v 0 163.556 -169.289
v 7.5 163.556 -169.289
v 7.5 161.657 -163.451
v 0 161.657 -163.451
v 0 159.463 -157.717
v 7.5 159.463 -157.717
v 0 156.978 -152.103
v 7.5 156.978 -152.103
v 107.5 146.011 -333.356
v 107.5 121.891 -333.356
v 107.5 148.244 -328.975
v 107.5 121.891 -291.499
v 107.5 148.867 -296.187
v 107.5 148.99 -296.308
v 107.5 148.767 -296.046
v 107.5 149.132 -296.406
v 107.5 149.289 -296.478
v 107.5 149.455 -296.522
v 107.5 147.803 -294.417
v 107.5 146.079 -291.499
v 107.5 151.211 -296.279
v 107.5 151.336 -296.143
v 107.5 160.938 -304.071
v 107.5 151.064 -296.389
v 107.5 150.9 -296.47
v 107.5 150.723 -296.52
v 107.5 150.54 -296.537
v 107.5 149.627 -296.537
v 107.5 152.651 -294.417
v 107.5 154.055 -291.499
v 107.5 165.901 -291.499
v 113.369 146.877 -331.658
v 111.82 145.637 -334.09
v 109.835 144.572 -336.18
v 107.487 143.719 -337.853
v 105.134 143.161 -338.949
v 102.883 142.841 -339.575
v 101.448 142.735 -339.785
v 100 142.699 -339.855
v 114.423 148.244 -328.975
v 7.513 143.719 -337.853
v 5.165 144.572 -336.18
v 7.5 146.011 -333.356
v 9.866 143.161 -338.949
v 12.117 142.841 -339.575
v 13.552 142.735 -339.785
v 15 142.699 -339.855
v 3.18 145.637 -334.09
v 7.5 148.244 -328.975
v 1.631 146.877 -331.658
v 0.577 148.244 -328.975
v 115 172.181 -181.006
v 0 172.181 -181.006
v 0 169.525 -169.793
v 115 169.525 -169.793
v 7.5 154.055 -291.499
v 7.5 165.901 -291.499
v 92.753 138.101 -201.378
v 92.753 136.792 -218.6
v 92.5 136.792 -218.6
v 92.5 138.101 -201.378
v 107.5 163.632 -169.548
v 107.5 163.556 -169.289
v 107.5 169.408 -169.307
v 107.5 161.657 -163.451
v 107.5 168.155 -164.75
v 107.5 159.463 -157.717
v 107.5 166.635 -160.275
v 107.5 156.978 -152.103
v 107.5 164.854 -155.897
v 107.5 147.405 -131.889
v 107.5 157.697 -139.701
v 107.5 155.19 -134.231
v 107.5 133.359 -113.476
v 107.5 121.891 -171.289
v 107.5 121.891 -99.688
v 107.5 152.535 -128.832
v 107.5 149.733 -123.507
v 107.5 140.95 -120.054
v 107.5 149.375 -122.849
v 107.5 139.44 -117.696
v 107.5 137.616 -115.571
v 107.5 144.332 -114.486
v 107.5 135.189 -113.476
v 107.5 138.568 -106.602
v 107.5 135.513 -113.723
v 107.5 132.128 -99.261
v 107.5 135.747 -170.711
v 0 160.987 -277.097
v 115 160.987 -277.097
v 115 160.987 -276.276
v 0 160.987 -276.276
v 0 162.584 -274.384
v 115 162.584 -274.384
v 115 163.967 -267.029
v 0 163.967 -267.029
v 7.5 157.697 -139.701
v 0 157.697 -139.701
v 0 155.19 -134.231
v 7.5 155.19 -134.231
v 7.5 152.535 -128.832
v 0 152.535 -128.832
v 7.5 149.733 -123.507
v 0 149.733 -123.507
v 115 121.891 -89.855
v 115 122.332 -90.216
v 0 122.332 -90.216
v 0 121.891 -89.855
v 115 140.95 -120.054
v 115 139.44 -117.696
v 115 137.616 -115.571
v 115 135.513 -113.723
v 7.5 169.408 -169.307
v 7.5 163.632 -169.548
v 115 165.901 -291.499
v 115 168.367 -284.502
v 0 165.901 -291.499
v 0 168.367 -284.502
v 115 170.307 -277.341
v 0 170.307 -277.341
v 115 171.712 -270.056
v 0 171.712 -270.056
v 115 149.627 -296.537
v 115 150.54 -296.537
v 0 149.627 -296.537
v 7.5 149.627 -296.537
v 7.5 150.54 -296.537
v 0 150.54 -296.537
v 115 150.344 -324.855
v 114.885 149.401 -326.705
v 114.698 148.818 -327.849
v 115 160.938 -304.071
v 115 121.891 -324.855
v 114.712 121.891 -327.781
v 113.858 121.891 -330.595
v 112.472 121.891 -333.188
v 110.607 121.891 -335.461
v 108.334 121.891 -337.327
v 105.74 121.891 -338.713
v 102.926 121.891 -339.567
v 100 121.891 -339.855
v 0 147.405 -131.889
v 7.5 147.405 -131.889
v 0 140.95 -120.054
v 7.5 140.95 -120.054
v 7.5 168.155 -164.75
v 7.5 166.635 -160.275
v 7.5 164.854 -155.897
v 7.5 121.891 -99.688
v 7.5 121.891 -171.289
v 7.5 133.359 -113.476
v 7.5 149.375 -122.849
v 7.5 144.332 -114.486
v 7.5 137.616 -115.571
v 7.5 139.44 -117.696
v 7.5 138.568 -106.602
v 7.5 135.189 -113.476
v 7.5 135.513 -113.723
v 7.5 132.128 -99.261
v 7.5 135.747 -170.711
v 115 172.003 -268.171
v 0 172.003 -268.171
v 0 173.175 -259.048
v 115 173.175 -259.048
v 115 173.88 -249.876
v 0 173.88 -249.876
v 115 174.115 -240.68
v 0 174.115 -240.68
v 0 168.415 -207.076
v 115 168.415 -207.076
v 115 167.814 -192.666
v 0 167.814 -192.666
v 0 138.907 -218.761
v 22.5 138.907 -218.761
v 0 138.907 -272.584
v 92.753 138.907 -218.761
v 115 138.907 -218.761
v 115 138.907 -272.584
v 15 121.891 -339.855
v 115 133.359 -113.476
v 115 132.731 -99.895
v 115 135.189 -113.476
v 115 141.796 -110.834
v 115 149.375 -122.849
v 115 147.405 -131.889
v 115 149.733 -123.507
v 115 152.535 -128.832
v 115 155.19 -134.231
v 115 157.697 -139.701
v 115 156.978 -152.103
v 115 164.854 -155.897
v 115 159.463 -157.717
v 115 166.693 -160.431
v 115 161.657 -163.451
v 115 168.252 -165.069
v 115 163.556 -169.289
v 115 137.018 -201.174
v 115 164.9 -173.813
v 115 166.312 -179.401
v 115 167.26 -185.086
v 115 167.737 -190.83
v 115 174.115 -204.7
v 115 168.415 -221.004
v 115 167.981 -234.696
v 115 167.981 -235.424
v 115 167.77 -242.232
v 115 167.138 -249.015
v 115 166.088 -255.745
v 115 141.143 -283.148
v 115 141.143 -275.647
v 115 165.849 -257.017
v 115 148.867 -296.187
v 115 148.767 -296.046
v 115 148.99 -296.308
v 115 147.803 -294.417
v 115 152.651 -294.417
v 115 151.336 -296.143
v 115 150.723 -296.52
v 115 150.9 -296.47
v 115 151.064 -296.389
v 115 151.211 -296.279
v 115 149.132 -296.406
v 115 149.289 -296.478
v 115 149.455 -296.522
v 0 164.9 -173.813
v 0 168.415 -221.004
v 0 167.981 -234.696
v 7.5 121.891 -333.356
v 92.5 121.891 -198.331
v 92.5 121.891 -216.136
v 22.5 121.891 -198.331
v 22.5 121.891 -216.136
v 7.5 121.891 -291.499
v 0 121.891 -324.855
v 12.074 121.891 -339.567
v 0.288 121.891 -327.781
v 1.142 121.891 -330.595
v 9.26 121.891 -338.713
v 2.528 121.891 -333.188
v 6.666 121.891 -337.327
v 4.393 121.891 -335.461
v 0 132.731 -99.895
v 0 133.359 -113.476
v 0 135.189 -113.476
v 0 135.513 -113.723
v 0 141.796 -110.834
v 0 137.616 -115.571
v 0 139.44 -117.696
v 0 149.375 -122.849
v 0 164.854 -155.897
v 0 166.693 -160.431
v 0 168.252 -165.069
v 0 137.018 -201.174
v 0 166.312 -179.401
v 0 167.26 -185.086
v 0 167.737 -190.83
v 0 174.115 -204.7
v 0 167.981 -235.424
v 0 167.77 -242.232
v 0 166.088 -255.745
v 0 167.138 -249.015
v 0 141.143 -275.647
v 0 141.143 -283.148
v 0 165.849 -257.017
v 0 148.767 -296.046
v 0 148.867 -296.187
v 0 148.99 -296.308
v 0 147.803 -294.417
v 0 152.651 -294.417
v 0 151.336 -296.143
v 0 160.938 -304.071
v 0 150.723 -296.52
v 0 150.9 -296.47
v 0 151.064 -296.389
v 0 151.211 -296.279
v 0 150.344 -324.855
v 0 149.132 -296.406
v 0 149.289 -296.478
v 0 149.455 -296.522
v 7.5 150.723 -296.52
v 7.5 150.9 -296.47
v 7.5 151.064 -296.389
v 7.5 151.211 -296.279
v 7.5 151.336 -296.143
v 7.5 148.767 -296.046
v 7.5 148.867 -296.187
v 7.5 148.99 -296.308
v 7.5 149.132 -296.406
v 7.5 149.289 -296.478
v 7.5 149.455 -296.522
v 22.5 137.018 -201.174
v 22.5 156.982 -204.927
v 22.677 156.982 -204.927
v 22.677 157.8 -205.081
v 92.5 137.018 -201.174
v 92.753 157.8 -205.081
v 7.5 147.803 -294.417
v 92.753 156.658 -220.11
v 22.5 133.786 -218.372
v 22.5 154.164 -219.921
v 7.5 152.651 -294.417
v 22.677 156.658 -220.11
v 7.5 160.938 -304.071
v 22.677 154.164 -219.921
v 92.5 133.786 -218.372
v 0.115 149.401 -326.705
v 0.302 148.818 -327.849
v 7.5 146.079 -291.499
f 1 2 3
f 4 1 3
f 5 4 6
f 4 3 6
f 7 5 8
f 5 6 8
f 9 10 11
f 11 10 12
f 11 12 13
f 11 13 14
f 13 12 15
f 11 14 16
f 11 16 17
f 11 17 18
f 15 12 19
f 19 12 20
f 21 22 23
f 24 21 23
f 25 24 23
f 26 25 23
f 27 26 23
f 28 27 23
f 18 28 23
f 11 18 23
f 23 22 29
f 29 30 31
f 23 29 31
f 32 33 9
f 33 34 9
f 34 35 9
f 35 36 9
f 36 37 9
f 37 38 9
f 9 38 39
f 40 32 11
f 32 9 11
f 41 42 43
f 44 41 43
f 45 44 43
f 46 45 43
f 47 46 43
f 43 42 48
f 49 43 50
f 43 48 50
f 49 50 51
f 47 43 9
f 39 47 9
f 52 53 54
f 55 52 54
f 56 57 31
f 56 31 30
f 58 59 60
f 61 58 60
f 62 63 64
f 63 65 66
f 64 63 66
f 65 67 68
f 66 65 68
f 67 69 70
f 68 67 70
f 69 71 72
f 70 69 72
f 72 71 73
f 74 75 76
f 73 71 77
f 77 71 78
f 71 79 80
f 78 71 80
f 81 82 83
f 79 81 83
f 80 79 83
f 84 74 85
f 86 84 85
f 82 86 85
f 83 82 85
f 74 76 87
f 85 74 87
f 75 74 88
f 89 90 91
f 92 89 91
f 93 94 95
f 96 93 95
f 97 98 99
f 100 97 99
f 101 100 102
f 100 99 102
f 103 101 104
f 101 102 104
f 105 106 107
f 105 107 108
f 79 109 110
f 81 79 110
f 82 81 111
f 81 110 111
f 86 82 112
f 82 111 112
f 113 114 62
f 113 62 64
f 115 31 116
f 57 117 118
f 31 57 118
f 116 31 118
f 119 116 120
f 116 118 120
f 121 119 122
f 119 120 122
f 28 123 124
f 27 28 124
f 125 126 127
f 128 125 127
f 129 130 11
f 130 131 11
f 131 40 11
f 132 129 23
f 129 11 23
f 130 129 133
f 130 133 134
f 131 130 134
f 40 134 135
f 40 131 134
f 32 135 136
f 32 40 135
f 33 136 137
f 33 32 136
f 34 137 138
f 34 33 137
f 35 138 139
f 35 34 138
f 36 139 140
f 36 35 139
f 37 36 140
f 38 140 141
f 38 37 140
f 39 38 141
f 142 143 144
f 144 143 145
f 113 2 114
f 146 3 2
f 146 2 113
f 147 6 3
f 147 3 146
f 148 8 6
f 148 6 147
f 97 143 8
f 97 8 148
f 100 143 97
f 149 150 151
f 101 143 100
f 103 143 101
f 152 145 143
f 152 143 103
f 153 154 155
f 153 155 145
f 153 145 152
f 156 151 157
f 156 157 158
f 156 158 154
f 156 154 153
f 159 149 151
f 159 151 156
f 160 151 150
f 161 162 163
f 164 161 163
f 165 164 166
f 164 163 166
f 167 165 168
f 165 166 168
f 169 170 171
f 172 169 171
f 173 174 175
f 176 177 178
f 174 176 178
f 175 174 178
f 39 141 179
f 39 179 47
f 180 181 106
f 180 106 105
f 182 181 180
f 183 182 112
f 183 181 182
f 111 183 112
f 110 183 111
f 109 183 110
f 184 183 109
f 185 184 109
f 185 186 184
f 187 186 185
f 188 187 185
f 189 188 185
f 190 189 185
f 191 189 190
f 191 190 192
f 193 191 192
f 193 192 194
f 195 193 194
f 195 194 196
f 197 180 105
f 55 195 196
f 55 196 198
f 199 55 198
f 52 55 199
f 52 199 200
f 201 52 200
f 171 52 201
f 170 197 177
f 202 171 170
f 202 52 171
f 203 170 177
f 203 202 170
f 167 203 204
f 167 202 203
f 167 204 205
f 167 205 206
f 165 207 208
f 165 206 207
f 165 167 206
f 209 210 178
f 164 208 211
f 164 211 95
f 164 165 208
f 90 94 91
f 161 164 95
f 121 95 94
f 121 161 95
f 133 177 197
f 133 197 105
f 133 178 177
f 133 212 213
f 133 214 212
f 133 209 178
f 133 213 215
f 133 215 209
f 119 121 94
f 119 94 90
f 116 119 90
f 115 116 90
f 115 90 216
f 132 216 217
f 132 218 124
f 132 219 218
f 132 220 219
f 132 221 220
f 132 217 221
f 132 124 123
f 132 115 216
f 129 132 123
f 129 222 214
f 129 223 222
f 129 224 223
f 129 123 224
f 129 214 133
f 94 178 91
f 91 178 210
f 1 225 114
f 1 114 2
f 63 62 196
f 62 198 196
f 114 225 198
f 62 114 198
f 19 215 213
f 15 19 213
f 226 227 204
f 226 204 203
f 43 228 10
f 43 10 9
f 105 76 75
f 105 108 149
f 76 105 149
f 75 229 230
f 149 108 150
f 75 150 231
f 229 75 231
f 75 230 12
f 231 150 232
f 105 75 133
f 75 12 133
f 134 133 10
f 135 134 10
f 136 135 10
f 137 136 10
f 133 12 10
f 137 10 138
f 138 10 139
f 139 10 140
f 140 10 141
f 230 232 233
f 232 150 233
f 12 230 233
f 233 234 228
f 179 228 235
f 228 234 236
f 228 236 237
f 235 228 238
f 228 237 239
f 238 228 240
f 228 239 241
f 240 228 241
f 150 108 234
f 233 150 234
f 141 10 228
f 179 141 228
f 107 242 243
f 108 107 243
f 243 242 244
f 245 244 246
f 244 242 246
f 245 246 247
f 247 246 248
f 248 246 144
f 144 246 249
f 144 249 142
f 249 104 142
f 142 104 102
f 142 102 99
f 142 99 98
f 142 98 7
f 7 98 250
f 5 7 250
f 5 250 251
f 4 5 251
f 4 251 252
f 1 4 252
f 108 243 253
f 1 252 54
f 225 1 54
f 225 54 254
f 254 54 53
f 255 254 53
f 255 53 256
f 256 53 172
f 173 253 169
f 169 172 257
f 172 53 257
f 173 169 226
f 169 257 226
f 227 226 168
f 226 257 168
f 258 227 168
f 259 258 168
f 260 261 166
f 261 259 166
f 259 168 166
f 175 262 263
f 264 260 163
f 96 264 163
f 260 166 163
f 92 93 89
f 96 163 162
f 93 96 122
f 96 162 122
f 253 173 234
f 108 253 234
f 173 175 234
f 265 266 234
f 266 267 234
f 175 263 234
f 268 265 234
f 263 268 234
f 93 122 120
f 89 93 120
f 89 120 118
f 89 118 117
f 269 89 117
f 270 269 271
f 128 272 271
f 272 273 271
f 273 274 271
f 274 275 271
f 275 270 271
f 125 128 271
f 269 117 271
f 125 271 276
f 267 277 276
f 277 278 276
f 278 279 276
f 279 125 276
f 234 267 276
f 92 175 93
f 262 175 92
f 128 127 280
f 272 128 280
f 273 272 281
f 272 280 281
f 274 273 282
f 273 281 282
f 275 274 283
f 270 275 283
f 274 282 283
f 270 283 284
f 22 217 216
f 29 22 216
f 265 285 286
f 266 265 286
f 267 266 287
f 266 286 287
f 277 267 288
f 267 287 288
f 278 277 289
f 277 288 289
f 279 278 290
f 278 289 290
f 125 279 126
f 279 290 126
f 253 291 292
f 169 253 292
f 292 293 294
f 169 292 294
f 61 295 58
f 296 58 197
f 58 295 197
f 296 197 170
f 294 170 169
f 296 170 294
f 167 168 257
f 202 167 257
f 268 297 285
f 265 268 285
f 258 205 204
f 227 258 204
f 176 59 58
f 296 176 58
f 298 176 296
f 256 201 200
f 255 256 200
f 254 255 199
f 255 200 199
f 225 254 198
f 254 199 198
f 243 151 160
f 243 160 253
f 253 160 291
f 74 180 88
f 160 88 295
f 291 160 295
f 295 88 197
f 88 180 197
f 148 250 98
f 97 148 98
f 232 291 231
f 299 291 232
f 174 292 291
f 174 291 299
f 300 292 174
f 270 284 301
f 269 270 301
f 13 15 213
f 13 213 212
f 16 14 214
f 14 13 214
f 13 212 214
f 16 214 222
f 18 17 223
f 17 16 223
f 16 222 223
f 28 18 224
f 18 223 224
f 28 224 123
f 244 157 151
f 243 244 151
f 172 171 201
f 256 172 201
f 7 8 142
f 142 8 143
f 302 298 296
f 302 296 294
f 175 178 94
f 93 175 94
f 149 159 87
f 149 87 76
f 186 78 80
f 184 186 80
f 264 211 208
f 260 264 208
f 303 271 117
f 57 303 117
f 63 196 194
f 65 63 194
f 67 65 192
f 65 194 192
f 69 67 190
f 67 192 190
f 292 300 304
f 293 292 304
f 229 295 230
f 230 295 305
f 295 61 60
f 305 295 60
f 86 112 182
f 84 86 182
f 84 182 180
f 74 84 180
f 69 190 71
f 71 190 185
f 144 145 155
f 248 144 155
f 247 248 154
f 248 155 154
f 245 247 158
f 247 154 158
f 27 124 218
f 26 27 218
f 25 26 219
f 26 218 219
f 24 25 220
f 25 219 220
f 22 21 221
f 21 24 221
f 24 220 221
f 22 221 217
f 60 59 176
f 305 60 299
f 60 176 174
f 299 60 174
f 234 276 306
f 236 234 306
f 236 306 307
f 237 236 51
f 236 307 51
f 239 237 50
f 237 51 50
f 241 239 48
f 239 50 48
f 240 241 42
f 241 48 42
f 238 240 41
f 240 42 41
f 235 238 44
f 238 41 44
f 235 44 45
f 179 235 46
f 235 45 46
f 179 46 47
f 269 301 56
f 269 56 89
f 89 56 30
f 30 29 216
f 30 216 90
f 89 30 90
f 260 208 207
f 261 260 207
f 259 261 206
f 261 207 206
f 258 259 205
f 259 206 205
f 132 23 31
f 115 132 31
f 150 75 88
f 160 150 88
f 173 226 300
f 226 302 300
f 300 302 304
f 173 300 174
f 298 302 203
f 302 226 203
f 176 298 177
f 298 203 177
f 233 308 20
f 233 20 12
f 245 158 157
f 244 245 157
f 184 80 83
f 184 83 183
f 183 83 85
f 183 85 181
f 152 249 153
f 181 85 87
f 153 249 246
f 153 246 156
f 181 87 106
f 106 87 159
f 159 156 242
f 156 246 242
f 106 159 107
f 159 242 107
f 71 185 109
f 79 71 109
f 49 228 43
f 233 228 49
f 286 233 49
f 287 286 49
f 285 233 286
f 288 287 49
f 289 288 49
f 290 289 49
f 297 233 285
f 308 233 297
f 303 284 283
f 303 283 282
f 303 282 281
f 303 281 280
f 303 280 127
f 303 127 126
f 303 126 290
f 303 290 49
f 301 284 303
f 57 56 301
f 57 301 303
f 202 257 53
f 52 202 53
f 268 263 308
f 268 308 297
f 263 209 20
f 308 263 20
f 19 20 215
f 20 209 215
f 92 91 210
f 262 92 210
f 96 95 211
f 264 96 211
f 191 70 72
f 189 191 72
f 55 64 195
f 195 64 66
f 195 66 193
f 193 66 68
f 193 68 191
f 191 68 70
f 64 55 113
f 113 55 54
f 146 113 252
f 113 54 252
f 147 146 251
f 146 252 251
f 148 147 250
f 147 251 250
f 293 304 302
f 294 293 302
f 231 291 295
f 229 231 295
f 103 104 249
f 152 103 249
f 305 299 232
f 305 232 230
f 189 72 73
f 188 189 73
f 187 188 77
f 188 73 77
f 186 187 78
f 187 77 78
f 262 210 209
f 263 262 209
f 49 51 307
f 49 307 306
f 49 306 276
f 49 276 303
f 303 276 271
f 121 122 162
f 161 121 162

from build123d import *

# Parameters (mm, degrees)
BOSS_EXTRUDE1_DEPTH = 115
CUT_EXTRUDE1_DEPTH  = 115
CUT_EXTRUDE2_START  = 7.5
CUT_EXTRUDE2_DEPTH  = 100
CUT_EXTRUDE3_START  = 7.5
CUT_EXTRUDE3_DEPTH  = 100
CUT_EXTRUDE4_REACH  = 260.68
SKETCH6_W           = 70.076051312
SKETCH6_H           = 19.92290321
CUT_EXTRUDE5_REACH  = 293.015
SKETCH5_W           = 70
SKETCH5_H           = 20.313376992
CUT_EXTRUDE6_REACH  = 334.213
SKETCH7_W           = 70
SKETCH7_H           = 17.498886338
FILLET1_R           = 15


# Read off the part's stored shape, not the designer's step: Cut-Extrude2, Cut-Extrude3
with BuildPart() as part:
    # Sketch1 → Boss-Extrude1 (new body)
    with BuildSketch(Plane(origin=(0, 0, 0), x_dir=(0, 0, -1), z_dir=(1, 0, 0))):
        with BuildLine():
            Line((89.8548345, 121.890508387), (339.8548345, 121.890508387))
            Line((339.8548345, 121.890508387), (339.8548345, 142.698803067))
            Line((339.8548345, 142.698803067), (328.974757131, 148.244473571))
            Line((328.974757131, 148.244473571), (304.07146893, 160.937897169))
            Line((304.07146893, 160.937897169), (291.499350701, 165.900575417))
            ThreePointArc((291.499350701, 165.900575417), (280.939522904, 169.403551358), (270.055923817, 171.711813574))
            Line((270.055923817, 171.711813574), (268.171463935, 172.003048284))
            ThreePointArc((268.171463935, 172.003048284), (254.466056361, 173.586145336), (240.679656072, 174.114879761))
            Line((240.679656072, 174.114879761), (232.021178794, 174.114879761))
            Line((232.021178794, 174.114879761), (204.700095622, 174.114879761))
            Line((204.700095622, 174.114879761), (181.005704906, 172.180643784))
            Line((181.005704906, 172.180643784), (169.793278807, 169.525069181))
            ThreePointArc((169.793278807, 169.525069181), (162.738148163, 167.508293641), (155.897481651, 164.85357451))
            Line((155.897481651, 164.85357451), (139.701268702, 157.697108323))
            ThreePointArc((139.701268702, 157.697108323), (131.522677332, 153.88092637), (123.507487012, 149.732513946))
            Line((123.507487012, 149.732513946), (122.849499947, 149.374661332))
            ThreePointArc((122.849499947, 149.374661332), (105.217865801, 137.440006065), (90.215677989, 122.332230589))
            Line((90.215677989, 122.332230589), (89.8548345, 121.890508387))
        make_face()
    extrude(amount=BOSS_EXTRUDE1_DEPTH)

    # Sketch2 → Cut-Extrude1 (cut)
    with BuildSketch(Plane(origin=(115, 0, 0), x_dir=(0, 0, -1), z_dir=(1, 0, 0))):
        with BuildLine():
            Line((113.475739659, 133.359325966), (201.174236889, 137.018348058))
            Line((201.174236889, 137.018348058), (207.075885424, 168.415118264))
            Line((207.075885424, 168.415118264), (192.666474105, 167.813918061))
            Line((192.666474105, 167.813918061), (190.829871081, 167.73728994))
            ThreePointArc((190.829871081, 167.73728994), (182.233808887, 166.844681368), (173.813252446, 164.899619793))
            Line((173.813252446, 164.899619793), (169.2892062, 163.555605085))
            ThreePointArc((169.2892062, 163.555605085), (160.569837528, 160.5967142), (152.103009161, 156.977979241))
            Line((152.103009161, 156.977979241), (131.888883088, 147.40524948))
            Line((131.888883088, 147.40524948), (120.054289503, 140.950016615))
            ThreePointArc((120.054289503, 140.950016615), (116.601738736, 138.565427019), (113.722697716, 135.512969462))
            Line((113.722697716, 135.512969462), (113.475739659, 135.188837012))
            Line((113.475739659, 135.188837012), (113.475739659, 133.359325966))
        make_face()
        with BuildLine():
            Line((221.003775967, 168.415118264), (218.761149524, 138.906875589))
            Line((218.761149524, 138.906875589), (272.584184163, 138.906875589))
            Line((272.584184163, 138.906875589), (274.383679522, 162.58444611))
            Line((274.383679522, 162.58444611), (267.028526617, 163.966993649))
            Line((267.028526617, 163.966993649), (257.016670223, 165.848921543))
            Line((257.016670223, 165.848921543), (255.744876296, 166.087980551))
            ThreePointArc((255.744876296, 166.087980551), (245.628472921, 167.506912168), (235.424062848, 167.981253005))
            Line((235.424062848, 167.981253005), (234.695600568, 167.981253005))
            Line((234.695600568, 167.981253005), (221.003775967, 168.415118264))
        make_face()
        with BuildLine():
            Line((276.275786009, 160.987395212), (275.646964577, 141.143186512))
            Line((275.646964577, 141.143186512), (283.14790924, 141.143186512))
            Line((283.14790924, 141.143186512), (294.416525801, 147.803376186))
            Line((294.416525801, 147.803376186), (296.046101937, 148.766518919))
            ThreePointArc((296.046101937, 148.766518919), (296.405855365, 149.13182216), (296.537289859, 149.627396535))
            Line((296.537289859, 149.627396535), (296.537289859, 150.540124257))
            ThreePointArc((296.537289859, 150.540124257), (296.433404588, 150.983946735), (296.143333074, 151.335555977))
            Line((296.143333074, 151.335555977), (294.416525801, 152.651218661))
            Line((294.416525801, 152.651218661), (277.097452917, 160.987395212))
            Line((277.097452917, 160.987395212), (276.275786009, 160.987395212))
        make_face()
    extrude(amount=-CUT_EXTRUDE1_DEPTH, mode=Mode.SUBTRACT)

    # Cut-Extrude2 outline → Cut-Extrude2 (cut)
    with BuildSketch(Plane.YZ.offset(CUT_EXTRUDE2_START)):
        with BuildLine():
            Line((121.890508387, -99.688159251), (121.890508387, -171.289102204))
            Line((121.890508387, -171.289102204), (135.747336393, -170.710957294))
            Line((135.747336393, -170.710957294), (133.359325966, -113.475739659))
            Line((133.359325966, -113.475739659), (135.188837012, -113.475739659))
            Line((135.188837012, -113.475739659), (135.512969462, -113.722697716))
            ThreePointArc((135.512969462, -113.722697716), (138.565427019, -116.601738736), (140.950016615, -120.054289503))
            Line((140.950016615, -120.054289503), (147.40524948, -131.888883088))
            Line((147.40524948, -131.888883088), (156.977979241, -152.103009161))
            ThreePointArc((156.977979241, -152.103009161), (160.5967142, -160.569837528), (163.555605085, -169.2892062))
            Line((163.555605085, -169.2892062), (163.632345036, -169.547518172))
            Line((163.632345036, -169.547518172), (169.408178174, -169.306534555))
            ThreePointArc((169.408178174, -169.306534555), (167.428165725, -162.501028912), (164.85357451, -155.897481651))
            Line((164.85357451, -155.897481651), (157.697108323, -139.701268702))
            ThreePointArc((157.697108323, -139.701268702), (153.88092637, -131.522677332), (149.732513946, -123.507487012))
            Line((149.732513946, -123.507487012), (149.374661332, -122.849499947))
            ThreePointArc((149.374661332, -122.849499947), (141.537958861, -110.480020928), (132.127738515, -99.261033903))
            Line((132.127738515, -99.261033903), (121.890508387, -99.688159251))
        make_face()
    extrude(amount=CUT_EXTRUDE2_DEPTH, mode=Mode.SUBTRACT)

    # Cut-Extrude3 outline → Cut-Extrude3 (cut)
    with BuildSketch(Plane.YZ.offset(CUT_EXTRUDE3_START)):
        with BuildLine():
            Line((121.890508387, -291.499350701), (121.890508387, -333.35633566))
            Line((121.890508387, -333.35633566), (146.011144709, -333.35633566))
            Line((146.011144709, -333.35633566), (160.937897169, -304.07146893))
            Line((160.937897169, -304.07146893), (165.900575417, -291.499350701))
            Line((165.900575417, -291.499350701), (154.055340396, -291.499350701))
            Line((154.055340396, -291.499350701), (152.651218661, -294.416525801))
            Line((152.651218661, -294.416525801), (151.335555977, -296.143333074))
            ThreePointArc((151.335555977, -296.143333074), (150.983946735, -296.433404588), (150.540124257, -296.537289859))
            Line((150.540124257, -296.537289859), (149.627396535, -296.537289859))
            ThreePointArc((149.627396535, -296.537289859), (149.13182216, -296.405855365), (148.766518919, -296.046101937))
            Line((148.766518919, -296.046101937), (146.079212499, -291.499350701))
            Line((146.079212499, -291.499350701), (121.890508387, -291.499350701))
        make_face()
    extrude(amount=CUT_EXTRUDE3_DEPTH, mode=Mode.SUBTRACT)

    # Cut-Extrude4: up to this plane
    cut_extrude4_end = Plane(origin=(0, 137.018348058, -201.174236889), z_dir=(0, -0.18473466771426061, -0.9827884322398701))
    # Sketch6 → Cut-Extrude4 (cut, up to the surface)
    with BuildSketch(Plane(origin=(0, -15.732649467, -207.008545619), x_dir=(-1, 0, 0), z_dir=(0, -0.07578145826840303, -0.9971244509000441)), mode=Mode.PRIVATE) as cut_extrude4_sk1:
        with Locations((-57.714978641, 162.925898332)):
            Rectangle(SKETCH6_W, SKETCH6_H)
    cut_extrude4_tool1 = split(extrude(cut_extrude4_sk1.sketch, amount=-CUT_EXTRUDE4_REACH, mode=Mode.PRIVATE), bisect_by=cut_extrude4_end, keep=Keep.BOTH, mode=Mode.PRIVATE)
    add(cut_extrude4_tool1.solids().sort_by_distance((57.714979, 146.724747, -219.355308))[0], mode=Mode.SUBTRACT)

    # Cut-Extrude5: up to this plane
    cut_extrude5_end = Plane(origin=(0, 168.415118264, -221.003775967), z_dir=(0, 0.07578145826840302, 0.9971244509000441))
    # Sketch5 → Cut-Extrude5 (cut, up to the surface)
    with BuildSketch(Plane(origin=(0, -31.848196468, -169.432405211), x_dir=(1, 0, 0), z_dir=(0, 0.18473466771426064, 0.9827884322398701)), mode=Mode.PRIVATE) as cut_extrude5_sk1:
        with Locations((57.5, 181.980591777)):
            Rectangle(SKETCH5_W, SKETCH5_H)
    cut_extrude5_tool1 = split(extrude(cut_extrude5_sk1.sketch, amount=-CUT_EXTRUDE5_REACH, mode=Mode.PRIVATE), bisect_by=cut_extrude5_end, keep=Keep.BOTH, mode=Mode.PRIVATE)
    add(cut_extrude5_tool1.solids().sort_by_distance((57.5, 147.000224, -203.050529))[0], mode=Mode.SUBTRACT)

    # Cut-Extrude6: up to this plane
    cut_extrude6_end = Plane(origin=(115, 121.890508387, -89.8548345), z_dir=(0, 1, 0))
    # Sketch7 → Cut-Extrude6 (cut, up to the surface)
    with BuildSketch(Plane(origin=(0, 168.866544526, -31.741831678), x_dir=(1, 0, 0), z_dir=(0, 0.9827884322398701, -0.18473466771426067)), mode=Mode.PRIVATE) as cut_extrude6_sk1:
        with Locations((57.5, 181.149117049)):
            Rectangle(SKETCH7_W, SKETCH7_H)
    cut_extrude6_tool1 = split(extrude(cut_extrude6_sk1.sketch, amount=-CUT_EXTRUDE6_REACH, mode=Mode.PRIVATE), bisect_by=cut_extrude6_end, keep=Keep.BOTH, mode=Mode.PRIVATE)
    add(cut_extrude6_tool1.solids().sort_by_distance((57.5, 135.402023, -209.773088))[0], mode=Mode.SUBTRACT)

    # Fillet1
    fillet1_edges = [part.edges().sort_by_distance(p)[0] for p in [
        (115, 132.294655727, -339.8548345),
        (0, 132.294655727, -339.8548345),
    ]]
    fillet(fillet1_edges, radius=FILLET1_R)


solid = part.part
